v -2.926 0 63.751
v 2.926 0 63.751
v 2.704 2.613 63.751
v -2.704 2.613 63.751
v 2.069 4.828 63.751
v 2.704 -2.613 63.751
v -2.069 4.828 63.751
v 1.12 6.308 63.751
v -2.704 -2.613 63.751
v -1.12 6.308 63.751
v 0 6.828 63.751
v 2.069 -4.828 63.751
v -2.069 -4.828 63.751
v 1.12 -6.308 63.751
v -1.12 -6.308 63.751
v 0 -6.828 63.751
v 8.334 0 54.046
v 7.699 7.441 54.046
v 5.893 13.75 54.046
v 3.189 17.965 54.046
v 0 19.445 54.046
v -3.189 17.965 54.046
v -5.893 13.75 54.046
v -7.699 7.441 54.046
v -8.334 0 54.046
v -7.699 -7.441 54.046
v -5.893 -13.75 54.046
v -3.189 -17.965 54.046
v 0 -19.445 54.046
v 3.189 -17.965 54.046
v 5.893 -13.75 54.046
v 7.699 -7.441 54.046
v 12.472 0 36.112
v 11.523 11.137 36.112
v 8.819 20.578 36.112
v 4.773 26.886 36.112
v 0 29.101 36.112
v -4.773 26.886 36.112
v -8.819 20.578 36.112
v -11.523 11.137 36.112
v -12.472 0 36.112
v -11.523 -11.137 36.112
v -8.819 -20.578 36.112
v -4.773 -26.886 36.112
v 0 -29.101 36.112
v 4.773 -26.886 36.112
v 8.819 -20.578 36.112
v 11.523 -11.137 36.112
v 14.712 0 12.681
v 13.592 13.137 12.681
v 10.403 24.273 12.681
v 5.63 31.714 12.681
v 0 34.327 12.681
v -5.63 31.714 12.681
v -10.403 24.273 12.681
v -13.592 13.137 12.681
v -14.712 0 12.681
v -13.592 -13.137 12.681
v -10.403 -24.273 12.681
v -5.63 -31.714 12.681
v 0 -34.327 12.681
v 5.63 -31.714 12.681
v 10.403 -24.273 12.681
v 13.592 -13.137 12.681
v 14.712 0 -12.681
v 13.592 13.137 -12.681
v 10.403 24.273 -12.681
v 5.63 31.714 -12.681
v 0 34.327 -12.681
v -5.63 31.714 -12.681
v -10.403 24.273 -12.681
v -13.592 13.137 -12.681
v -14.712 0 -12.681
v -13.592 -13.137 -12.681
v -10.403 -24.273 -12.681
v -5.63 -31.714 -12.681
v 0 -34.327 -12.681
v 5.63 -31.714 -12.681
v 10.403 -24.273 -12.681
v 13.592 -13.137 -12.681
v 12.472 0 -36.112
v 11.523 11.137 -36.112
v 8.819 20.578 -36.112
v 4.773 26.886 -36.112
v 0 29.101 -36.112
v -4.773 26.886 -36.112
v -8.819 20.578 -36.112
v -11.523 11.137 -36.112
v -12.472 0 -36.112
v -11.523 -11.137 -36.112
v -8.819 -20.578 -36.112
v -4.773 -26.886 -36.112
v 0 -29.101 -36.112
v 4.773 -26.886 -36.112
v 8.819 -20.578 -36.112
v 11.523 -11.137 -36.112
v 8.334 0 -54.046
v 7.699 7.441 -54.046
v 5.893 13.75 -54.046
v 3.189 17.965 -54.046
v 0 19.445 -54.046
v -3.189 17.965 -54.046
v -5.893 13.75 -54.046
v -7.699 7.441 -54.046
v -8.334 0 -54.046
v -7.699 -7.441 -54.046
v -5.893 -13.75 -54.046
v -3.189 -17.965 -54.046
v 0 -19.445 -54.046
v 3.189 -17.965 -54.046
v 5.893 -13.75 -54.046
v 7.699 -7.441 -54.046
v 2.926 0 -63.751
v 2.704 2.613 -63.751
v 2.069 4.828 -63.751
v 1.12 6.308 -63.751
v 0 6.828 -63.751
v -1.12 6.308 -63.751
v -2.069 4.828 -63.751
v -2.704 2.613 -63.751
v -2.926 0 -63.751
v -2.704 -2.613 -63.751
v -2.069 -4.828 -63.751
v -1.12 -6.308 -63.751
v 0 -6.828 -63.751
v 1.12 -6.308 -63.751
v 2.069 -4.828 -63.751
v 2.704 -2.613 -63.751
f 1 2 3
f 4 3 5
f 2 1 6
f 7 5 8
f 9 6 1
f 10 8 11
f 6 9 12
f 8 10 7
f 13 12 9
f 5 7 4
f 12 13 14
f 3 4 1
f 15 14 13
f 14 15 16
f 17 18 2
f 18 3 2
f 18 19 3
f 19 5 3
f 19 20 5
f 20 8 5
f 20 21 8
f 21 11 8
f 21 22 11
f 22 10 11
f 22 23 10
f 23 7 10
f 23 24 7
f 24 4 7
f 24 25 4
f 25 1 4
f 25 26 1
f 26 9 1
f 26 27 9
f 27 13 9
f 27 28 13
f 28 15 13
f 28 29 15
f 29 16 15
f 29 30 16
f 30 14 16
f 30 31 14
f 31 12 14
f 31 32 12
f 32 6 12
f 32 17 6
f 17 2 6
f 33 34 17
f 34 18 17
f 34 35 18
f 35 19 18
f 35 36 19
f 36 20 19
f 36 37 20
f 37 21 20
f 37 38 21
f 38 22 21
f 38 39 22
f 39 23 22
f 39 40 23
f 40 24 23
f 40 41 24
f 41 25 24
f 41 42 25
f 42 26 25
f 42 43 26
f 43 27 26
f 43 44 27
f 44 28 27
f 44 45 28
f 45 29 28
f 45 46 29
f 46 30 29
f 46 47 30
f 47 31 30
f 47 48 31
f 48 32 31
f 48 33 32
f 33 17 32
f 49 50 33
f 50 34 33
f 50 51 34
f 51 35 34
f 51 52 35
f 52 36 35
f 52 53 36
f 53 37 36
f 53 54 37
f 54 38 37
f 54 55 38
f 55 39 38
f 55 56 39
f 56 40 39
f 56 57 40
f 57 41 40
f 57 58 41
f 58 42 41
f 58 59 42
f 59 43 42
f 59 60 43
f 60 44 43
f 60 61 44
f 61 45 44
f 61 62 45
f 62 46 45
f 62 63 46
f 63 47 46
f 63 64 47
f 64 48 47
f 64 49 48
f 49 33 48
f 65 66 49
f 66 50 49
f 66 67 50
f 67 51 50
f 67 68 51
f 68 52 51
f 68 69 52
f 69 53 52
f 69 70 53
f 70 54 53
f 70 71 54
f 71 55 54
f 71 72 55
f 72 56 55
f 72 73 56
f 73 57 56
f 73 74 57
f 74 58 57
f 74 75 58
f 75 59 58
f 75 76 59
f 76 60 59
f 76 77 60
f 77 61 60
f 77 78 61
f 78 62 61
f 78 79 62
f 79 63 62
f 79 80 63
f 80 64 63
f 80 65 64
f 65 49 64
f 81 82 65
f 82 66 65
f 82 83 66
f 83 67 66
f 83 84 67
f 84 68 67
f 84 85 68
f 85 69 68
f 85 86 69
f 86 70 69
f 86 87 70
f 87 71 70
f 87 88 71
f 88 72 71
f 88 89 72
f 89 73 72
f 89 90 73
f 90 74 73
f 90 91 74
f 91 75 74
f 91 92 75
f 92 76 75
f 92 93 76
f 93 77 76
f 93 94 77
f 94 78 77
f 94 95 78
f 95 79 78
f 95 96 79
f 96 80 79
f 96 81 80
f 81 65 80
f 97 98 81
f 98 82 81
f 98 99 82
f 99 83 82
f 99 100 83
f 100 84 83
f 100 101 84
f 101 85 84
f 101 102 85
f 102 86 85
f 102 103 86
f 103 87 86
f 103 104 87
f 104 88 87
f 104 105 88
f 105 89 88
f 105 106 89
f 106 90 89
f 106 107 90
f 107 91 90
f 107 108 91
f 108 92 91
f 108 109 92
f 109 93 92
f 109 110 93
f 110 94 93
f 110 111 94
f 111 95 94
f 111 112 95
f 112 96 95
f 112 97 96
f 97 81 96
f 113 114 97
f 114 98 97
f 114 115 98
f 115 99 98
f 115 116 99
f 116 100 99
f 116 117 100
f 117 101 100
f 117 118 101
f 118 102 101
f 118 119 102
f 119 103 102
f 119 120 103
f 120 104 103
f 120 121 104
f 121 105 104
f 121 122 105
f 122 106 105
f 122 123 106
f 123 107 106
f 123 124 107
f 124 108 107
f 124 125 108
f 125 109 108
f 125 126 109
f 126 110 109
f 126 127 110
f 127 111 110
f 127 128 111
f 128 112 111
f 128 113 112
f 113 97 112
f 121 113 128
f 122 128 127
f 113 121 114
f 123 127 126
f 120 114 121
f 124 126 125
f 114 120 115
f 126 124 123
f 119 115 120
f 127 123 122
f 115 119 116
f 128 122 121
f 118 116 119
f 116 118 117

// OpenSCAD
// Generated by SolidPython 1.0.1 on 2020-07-29 00:46:45


scale(v = [3, 7, 13]) {
	sphere(r = 5);
}
/***********************************************
*********      SolidPython code:      **********
************************************************
 
# import packages: SolidPython
from solid import *
from solid.utils import *
from itertools import chain, combinations, permutations


class Resize:

    def __init__(self, scad_file):
        self.scad_file = scad_file
        #self.scad_file = import_scad(scad_file)
        # cone/cylinder param:
        self.r1 = 0
        self.r2 = 0
        self.h = 0
        # rectangular prism param:
        self.w = 0
        self.l = 0
        # ellipse param:
        self.r = 0

    # import OpenScad code (file name corresponds to shape)


    # classify shape + parameters
    def assign(self, param1, param2, param3):
        if self.scad_file == 'cone.scad':
            self.r1 = param1
            self.r2 = param2
            self.h = param3
        elif self.scad_file == 'cylinder.scad':
            self.r1 = param1
            self.r2 = param2
            self.h = param3
        elif self.scad_file == 'rectangularPrism.scad':
            self.h = param1
            self.l = param2
            self.w = param3
        else:
            self.r = param1
            self.h = param2

    # resize parameters
    def iterate(self):
        x = range(3, 20, 2)
        i = 1
        if self.scad_file == 'cone.scad':
            tempList = list(permutations(x, 2))
            for temp in tempList:
                param1 = temp[0]
                param2 = temp[1]
                filepath = 'produced_scad_files/' + 'cone' + str(param1) + '_' + str(param2) + '_' + '.scad'
                scad_render_to_file(cylinder(h=param1, r1=param2, r2=0), filepath)

        elif self.scad_file == 'cylinder.scad':
            tempList = list(permutations(x, 3))
            for temp in tempList:
                param1 = temp[0]
                param2 = temp[1]
                filepath = 'produced_scad_files/' + 'cylinder' + str(param1) + '_' + str(param2) + '_' + '.scad'
                scad_render_to_file(cylinder(h=param1, r1=param2, r2=param2), filepath)

        elif self.scad_file == 'rectangularPrism.scad':
            tempList = list(permutations(x, 3))
            for temp in tempList:
                param1 = temp[0]
                param2 = temp[1]
                param3 = temp[2]
                filepath = 'produced_scad_files/' + 'rectangularPrism' + str(param1) + '_' + str(param2) + '_' + str(
                    param3) + '.scad'
                scad_render_to_file(cube(size=(param1, param2, param3)), filepath)

        elif self.scad_file == 'ellipse.scad':
            tempList = list(permutations(x, 4))
            for temp in tempList:
                param1 = temp[0]
                param2 = temp[1]
                param3 = temp[2]
                param4 = temp[3]
                filepath = 'produced_scad_files/' + 'ellipse' + str(param1) + '_' + str(param2) + '_' + str(param3) + '_' + str(param4) + '.scad'
                scad_render_to_file(scale([param1, param2, param3])(sphere(r=param4)), filepath)

    def render_to_scadfile(self):
        scad_render_to_file(scad, 'example.scad') 
 
************************************************/
